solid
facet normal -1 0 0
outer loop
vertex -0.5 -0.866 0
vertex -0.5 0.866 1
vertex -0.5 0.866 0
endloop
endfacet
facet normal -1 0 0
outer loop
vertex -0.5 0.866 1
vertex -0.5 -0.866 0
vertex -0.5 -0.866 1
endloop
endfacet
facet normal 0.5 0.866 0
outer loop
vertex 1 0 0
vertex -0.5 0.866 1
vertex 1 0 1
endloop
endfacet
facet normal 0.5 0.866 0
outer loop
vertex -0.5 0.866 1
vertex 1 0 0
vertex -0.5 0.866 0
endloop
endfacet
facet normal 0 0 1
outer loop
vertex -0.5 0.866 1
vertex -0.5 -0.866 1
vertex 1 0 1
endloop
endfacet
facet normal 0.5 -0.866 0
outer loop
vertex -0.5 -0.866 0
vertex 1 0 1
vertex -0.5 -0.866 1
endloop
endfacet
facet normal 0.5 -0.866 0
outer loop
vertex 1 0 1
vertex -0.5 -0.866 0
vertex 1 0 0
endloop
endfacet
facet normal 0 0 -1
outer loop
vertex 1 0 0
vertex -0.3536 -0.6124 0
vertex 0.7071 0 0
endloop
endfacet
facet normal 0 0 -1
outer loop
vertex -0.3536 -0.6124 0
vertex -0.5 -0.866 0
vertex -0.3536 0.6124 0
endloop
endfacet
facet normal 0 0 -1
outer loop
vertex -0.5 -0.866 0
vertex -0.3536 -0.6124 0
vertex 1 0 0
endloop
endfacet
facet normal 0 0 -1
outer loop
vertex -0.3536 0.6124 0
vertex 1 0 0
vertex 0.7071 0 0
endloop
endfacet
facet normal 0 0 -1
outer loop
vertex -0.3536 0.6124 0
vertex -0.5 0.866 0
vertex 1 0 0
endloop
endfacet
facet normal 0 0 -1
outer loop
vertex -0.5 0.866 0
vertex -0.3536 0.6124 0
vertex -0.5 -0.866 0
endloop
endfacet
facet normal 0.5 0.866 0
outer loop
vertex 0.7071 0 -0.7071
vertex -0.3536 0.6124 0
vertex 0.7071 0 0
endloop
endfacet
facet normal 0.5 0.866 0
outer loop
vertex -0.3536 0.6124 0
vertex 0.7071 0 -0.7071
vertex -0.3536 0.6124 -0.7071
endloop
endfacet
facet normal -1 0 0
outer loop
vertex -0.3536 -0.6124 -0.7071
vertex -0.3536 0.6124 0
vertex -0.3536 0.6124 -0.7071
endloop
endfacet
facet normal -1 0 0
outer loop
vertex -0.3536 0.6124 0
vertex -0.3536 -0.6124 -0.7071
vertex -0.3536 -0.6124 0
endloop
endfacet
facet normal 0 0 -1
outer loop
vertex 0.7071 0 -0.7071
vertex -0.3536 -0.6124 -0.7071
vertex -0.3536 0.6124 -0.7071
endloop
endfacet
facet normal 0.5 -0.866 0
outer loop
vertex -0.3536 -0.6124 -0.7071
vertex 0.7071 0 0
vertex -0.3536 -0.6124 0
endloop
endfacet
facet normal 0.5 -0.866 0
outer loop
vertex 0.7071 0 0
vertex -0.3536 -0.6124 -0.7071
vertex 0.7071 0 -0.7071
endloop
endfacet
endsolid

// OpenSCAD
cube(1/0);
cube([0,0,1/0]);
cylinder(h=10, r=1/0);
cylinder(h=10, r1=1, r2=1/0);
cylinder(h=1/0);
sphere(1/0);
polygon([[0,0,0],[1,0,0],[1,1/0,0]]);
polyhedron(points = [[1/0,0,0],[-1,0,0],[0,1,0],[0,-1,0],[0,0,1],[0,0,-1]],
    faces = [[0,4,2],[0,2,5],[0,3,4],[0,5,3],[1,2,4],[1,5,2],[1,4,3], [1,3,5]]);

cylinder($fn=1/0);
sphere($fn=1/0);
